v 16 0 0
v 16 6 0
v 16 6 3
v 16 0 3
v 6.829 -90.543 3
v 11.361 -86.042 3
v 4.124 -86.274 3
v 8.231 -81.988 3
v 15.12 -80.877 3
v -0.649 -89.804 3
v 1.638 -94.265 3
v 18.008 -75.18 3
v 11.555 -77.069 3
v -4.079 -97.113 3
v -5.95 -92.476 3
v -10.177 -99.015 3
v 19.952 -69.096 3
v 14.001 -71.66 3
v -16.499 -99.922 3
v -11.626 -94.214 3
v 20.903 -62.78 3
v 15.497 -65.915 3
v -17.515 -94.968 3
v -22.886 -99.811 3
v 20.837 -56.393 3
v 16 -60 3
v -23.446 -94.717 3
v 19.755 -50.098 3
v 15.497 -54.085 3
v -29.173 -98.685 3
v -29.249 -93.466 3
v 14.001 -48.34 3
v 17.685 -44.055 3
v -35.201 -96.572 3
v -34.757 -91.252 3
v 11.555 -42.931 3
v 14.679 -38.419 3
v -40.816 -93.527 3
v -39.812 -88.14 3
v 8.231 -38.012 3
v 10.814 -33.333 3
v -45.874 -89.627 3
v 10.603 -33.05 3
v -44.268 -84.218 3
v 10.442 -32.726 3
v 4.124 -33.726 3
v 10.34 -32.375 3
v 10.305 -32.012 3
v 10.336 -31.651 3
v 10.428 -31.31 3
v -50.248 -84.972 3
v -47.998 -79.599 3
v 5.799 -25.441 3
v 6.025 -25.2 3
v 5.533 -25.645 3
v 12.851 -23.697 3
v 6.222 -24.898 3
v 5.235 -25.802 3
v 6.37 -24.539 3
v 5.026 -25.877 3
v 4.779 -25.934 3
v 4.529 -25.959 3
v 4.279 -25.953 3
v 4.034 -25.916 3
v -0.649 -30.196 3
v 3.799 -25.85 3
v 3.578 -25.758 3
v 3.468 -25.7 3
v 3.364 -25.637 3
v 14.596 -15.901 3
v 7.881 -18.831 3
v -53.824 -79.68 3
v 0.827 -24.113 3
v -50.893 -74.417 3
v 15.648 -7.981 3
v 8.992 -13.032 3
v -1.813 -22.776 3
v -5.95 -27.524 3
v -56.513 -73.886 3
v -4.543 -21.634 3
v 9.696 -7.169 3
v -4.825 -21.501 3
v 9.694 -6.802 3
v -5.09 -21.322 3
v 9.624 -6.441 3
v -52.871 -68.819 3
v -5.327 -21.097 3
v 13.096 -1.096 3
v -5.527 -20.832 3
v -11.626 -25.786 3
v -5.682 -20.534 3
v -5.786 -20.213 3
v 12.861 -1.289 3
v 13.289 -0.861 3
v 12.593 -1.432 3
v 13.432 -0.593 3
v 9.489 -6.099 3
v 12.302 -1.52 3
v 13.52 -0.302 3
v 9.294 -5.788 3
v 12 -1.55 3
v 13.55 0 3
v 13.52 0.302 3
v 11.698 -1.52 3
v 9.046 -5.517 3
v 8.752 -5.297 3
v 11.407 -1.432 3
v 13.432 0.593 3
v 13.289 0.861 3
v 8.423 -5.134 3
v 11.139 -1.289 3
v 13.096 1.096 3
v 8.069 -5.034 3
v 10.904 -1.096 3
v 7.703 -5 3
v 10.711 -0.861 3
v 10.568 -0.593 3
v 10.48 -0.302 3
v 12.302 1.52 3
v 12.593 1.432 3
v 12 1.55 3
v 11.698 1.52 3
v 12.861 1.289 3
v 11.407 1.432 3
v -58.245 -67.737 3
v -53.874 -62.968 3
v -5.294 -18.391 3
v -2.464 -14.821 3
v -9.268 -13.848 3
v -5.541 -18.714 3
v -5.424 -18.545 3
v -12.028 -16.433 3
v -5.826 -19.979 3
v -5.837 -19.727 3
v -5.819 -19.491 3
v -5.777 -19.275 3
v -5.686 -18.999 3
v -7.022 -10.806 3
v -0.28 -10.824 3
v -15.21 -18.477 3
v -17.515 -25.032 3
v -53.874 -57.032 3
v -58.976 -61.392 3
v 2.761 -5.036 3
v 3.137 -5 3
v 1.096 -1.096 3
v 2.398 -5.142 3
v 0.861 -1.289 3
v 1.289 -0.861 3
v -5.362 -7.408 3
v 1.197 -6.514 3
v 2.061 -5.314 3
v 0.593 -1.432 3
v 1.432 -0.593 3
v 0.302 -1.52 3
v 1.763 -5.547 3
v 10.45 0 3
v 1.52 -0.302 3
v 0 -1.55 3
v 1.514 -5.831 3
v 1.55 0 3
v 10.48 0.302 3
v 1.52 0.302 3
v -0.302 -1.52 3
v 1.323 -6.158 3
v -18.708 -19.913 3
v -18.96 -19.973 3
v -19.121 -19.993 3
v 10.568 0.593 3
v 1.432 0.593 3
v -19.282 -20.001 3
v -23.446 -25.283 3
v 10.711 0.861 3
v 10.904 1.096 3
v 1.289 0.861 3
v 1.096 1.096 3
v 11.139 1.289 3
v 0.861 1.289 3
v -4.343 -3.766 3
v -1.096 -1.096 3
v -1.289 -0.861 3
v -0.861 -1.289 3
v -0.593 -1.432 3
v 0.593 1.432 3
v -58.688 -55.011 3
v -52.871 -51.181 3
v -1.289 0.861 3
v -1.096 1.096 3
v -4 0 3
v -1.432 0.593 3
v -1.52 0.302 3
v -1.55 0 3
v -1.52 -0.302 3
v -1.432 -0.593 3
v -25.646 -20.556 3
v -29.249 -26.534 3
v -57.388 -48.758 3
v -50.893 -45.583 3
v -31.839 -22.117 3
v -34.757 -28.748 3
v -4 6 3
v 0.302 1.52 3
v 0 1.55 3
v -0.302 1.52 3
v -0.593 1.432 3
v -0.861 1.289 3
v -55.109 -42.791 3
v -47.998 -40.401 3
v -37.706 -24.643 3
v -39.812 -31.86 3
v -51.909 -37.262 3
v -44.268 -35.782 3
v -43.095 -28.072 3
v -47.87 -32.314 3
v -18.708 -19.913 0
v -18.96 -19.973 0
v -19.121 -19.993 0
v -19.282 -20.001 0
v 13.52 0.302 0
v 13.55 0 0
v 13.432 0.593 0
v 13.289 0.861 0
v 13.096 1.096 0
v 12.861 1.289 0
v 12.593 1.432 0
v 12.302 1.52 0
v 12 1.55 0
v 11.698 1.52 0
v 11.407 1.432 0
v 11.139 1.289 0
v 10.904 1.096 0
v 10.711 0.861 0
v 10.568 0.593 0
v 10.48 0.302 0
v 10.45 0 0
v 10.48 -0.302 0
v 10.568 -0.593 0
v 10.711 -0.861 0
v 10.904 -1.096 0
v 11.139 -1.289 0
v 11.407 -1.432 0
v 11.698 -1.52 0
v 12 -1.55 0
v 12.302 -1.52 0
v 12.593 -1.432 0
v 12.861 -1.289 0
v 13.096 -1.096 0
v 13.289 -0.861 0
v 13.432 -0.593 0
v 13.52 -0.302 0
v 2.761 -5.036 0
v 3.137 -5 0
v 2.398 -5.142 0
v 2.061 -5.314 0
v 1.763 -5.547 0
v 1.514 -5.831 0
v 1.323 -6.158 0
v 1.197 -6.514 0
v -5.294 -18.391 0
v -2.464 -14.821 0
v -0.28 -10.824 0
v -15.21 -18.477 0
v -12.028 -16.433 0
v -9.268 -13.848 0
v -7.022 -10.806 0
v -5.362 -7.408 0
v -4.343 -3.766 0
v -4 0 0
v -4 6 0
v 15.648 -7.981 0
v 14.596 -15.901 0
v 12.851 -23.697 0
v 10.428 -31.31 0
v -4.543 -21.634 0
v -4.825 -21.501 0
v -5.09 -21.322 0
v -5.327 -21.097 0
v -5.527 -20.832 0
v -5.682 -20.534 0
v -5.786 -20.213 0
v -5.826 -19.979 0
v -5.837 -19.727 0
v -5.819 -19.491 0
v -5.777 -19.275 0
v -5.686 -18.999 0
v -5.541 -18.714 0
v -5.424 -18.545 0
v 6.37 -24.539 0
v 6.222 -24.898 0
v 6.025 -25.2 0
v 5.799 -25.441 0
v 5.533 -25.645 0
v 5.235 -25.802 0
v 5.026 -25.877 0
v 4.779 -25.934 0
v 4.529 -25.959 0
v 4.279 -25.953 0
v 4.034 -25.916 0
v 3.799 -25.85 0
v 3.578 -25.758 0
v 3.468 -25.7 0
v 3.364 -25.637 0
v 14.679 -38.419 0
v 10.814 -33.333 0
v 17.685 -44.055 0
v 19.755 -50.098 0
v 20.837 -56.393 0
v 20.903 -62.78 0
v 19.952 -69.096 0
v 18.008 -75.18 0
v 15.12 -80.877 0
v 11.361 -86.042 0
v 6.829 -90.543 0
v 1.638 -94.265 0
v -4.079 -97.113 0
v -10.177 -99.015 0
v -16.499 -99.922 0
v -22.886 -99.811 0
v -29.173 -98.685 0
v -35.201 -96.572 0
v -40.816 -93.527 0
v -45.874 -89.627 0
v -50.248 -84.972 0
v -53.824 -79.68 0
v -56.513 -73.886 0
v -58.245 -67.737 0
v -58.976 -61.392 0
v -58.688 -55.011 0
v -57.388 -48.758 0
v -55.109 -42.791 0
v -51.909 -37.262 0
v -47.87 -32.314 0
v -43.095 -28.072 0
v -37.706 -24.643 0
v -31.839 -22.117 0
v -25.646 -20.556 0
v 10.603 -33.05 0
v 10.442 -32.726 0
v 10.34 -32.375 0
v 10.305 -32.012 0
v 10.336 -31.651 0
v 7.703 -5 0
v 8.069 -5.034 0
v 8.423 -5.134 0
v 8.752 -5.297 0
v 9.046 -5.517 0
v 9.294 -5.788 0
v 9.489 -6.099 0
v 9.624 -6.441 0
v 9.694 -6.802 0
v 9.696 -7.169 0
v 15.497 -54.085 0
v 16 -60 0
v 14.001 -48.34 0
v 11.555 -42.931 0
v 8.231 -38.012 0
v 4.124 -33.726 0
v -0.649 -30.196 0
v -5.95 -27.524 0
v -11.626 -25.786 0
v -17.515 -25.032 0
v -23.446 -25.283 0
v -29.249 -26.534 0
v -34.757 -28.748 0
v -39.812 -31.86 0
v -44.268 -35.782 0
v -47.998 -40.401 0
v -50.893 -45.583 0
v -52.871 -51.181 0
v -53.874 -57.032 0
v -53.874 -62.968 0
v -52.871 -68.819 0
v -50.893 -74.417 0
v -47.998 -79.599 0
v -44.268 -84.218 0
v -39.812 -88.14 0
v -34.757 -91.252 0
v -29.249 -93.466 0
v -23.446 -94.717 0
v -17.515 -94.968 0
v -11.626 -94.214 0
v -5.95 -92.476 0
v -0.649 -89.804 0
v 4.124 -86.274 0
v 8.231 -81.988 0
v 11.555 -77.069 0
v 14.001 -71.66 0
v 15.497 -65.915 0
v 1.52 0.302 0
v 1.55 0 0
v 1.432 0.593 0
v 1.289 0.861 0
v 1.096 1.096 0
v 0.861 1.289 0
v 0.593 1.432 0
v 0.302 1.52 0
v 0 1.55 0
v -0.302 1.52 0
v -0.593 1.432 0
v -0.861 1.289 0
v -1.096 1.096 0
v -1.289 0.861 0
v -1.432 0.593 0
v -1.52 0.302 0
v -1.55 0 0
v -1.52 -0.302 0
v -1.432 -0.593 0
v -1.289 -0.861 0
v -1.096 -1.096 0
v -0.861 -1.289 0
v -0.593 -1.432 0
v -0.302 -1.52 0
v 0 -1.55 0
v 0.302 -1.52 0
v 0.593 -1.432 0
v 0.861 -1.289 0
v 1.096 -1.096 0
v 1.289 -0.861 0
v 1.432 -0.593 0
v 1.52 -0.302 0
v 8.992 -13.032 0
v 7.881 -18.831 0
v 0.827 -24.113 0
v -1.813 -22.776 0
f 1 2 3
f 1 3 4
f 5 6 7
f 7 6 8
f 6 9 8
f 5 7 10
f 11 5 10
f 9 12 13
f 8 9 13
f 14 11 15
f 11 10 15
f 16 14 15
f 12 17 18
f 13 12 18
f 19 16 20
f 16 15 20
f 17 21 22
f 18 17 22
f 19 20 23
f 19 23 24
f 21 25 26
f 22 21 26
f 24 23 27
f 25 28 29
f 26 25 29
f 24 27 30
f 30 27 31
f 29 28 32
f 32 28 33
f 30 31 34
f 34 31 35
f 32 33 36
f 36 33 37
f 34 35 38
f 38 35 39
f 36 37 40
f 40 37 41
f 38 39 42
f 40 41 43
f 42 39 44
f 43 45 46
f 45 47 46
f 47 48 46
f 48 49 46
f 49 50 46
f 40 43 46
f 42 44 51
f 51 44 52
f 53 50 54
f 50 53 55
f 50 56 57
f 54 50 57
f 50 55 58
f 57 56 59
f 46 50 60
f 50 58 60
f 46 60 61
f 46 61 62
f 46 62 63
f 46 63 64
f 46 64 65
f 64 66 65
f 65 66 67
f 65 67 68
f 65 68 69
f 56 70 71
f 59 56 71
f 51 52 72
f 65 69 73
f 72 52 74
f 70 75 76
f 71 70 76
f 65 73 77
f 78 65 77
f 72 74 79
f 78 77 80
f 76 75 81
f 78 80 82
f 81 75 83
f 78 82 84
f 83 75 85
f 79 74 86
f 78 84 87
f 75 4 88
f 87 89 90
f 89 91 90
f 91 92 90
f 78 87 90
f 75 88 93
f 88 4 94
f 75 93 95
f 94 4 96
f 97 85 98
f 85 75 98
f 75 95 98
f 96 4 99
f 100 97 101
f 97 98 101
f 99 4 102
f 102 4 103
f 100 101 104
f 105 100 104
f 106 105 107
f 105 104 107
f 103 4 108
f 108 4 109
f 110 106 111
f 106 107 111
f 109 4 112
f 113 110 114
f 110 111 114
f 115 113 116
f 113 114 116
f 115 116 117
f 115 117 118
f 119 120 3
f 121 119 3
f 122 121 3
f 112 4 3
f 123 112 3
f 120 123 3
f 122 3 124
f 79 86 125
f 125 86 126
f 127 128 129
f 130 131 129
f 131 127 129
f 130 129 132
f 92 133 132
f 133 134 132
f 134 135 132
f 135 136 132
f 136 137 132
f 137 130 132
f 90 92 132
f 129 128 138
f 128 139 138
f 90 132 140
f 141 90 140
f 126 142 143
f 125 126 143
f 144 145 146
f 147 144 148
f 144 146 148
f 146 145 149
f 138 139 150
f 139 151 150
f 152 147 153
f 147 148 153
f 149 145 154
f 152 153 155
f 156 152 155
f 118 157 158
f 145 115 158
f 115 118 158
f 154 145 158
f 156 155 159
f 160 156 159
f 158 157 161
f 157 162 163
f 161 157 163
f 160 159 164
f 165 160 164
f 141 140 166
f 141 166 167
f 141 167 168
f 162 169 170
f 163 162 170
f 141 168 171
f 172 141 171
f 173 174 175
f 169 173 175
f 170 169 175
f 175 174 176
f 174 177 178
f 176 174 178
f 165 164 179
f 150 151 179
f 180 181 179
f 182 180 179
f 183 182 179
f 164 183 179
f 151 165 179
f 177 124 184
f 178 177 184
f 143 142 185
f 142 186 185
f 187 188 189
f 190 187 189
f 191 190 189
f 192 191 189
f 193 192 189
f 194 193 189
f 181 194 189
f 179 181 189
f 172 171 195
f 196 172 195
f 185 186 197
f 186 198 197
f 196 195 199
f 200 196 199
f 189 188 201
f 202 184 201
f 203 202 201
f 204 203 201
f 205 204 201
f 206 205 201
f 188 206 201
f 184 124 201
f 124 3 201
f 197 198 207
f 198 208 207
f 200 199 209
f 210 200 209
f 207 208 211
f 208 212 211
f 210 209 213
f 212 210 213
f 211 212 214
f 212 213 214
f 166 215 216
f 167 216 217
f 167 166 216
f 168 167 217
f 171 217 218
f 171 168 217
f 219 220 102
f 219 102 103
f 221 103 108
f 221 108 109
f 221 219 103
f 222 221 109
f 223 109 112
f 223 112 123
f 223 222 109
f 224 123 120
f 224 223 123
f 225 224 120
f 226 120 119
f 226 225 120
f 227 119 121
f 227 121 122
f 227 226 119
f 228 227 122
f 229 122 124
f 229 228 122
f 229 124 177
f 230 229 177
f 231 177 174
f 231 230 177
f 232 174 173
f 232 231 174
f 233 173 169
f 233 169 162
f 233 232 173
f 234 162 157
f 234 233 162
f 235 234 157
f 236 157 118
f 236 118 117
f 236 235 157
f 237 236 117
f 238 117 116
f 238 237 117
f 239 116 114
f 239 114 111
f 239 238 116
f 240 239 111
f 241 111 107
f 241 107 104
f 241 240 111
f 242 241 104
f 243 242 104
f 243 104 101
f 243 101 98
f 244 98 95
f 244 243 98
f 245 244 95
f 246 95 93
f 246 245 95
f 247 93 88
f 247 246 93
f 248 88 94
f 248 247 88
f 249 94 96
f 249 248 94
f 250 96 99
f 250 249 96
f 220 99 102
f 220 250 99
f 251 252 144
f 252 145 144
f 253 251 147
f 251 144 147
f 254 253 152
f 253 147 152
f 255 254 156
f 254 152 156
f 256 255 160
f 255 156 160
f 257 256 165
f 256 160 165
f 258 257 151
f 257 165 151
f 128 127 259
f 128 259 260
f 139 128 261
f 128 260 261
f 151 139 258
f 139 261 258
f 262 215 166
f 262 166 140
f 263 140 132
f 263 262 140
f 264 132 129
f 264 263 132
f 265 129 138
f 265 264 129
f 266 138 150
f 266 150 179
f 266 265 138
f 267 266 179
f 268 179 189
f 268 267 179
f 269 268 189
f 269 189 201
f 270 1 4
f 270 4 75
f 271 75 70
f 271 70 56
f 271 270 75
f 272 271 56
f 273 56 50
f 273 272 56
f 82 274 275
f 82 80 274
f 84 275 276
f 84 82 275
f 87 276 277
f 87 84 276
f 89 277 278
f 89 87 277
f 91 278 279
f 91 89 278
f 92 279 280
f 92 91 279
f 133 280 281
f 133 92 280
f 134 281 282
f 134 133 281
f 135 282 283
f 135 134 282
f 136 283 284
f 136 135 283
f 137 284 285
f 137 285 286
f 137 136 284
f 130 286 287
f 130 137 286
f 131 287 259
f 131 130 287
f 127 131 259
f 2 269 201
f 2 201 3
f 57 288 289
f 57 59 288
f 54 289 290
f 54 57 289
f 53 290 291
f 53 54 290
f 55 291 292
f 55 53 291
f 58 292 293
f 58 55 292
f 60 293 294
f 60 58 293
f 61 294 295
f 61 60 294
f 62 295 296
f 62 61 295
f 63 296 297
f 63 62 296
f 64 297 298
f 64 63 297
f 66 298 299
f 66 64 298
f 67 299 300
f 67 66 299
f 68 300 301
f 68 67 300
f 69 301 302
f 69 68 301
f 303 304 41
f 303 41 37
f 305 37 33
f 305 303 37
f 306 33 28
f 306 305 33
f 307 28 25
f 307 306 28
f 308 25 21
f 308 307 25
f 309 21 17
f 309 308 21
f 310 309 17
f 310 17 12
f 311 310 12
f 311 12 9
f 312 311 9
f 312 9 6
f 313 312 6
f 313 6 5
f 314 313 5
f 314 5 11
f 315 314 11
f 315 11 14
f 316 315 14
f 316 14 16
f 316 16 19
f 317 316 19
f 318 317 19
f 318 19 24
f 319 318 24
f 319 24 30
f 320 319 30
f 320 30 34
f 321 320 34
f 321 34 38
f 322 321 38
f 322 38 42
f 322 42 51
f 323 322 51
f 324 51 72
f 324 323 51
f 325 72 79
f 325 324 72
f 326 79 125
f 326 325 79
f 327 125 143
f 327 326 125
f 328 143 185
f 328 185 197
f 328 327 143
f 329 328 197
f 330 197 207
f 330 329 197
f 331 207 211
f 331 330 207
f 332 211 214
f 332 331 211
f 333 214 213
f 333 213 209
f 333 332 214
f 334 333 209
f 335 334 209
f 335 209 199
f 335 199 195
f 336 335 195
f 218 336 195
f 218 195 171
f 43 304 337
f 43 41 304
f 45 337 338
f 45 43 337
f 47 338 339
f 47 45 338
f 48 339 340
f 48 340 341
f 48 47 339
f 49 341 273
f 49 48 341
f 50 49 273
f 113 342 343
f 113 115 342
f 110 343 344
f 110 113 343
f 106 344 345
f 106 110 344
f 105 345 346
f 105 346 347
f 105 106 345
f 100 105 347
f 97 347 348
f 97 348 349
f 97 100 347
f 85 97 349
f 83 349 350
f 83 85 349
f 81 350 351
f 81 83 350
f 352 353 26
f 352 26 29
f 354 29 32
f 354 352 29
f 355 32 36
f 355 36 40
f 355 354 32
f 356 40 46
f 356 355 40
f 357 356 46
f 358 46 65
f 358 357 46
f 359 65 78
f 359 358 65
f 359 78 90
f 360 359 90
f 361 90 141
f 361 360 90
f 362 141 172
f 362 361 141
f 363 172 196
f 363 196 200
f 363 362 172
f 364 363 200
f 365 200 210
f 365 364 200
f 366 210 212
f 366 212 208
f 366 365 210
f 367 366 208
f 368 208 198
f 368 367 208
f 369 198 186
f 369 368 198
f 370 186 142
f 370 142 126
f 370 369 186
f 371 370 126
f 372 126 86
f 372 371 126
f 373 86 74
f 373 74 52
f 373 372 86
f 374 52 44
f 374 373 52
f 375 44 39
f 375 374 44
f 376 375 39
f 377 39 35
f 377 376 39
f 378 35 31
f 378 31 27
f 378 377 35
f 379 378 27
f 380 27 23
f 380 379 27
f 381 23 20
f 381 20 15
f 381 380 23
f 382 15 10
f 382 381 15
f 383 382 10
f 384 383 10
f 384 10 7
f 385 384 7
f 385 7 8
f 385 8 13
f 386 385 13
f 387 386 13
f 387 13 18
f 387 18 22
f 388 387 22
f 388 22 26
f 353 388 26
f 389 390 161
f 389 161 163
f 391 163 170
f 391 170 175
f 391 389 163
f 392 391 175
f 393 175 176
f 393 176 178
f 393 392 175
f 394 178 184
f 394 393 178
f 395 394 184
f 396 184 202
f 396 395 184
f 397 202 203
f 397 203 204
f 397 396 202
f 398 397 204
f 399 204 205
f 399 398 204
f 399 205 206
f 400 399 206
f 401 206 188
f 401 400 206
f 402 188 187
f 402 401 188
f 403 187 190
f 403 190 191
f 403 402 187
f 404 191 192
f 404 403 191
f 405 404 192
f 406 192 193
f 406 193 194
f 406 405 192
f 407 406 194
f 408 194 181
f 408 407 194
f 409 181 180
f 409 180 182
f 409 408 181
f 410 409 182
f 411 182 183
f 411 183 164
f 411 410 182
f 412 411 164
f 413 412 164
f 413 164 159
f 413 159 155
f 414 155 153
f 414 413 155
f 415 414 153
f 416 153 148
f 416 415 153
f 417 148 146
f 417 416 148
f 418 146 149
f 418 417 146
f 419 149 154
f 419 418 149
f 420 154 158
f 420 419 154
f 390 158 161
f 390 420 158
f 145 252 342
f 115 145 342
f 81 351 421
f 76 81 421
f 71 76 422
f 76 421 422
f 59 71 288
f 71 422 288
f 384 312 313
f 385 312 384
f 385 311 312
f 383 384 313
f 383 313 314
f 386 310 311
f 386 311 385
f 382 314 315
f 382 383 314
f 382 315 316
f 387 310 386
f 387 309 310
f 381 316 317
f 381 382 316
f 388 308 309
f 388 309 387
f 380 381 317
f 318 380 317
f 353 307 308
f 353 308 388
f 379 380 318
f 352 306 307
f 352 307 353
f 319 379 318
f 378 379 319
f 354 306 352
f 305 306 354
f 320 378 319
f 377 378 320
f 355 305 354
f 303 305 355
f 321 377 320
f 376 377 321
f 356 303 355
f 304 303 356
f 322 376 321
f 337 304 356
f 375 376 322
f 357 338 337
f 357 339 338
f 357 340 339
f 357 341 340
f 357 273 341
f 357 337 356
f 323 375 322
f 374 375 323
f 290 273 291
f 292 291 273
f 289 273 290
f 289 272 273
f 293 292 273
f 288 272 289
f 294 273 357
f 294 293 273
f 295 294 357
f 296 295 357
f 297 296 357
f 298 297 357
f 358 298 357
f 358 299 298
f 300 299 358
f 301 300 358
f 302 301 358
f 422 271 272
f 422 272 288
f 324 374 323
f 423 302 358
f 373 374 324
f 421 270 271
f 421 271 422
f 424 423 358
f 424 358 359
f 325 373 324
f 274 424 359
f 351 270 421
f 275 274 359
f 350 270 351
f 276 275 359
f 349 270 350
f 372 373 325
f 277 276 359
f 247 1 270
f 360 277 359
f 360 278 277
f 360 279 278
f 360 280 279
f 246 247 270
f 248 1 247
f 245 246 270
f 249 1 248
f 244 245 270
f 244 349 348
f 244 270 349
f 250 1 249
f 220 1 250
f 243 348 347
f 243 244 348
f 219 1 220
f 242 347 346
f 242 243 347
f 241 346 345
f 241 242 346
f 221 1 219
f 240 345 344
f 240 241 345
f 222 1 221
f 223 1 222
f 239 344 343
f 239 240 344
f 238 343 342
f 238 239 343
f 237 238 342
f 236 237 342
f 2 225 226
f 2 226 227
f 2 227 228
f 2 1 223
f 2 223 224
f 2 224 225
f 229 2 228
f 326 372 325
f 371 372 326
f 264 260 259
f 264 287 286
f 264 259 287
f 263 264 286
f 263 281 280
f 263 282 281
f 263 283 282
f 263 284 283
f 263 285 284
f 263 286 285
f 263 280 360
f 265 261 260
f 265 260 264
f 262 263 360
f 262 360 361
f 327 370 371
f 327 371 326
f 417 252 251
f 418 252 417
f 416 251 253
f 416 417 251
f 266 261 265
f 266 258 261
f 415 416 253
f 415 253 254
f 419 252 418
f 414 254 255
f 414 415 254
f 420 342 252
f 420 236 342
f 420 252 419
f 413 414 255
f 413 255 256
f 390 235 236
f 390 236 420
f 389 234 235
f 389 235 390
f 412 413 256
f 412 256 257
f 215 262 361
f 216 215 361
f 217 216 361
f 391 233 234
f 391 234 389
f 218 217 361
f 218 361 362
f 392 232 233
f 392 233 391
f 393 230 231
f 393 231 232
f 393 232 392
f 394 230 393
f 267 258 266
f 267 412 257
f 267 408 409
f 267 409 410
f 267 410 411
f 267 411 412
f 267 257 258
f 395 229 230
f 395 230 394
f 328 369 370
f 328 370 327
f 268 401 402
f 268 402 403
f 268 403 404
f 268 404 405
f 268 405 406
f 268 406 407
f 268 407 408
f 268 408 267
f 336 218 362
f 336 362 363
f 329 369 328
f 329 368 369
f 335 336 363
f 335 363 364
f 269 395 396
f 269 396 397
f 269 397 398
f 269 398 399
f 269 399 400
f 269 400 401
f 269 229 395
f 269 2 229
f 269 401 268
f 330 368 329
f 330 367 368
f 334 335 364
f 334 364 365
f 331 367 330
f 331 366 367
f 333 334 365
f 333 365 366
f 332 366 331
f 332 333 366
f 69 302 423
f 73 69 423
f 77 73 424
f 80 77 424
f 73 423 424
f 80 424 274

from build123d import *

# Parameters (mm, degrees)
SKETCH_1_R      = 1.55
SKETCH_1_R_2    = 35
EXTRUDE_1_DEPTH = 3
FILLET_1_R      = 2


with BuildPart() as part:
    # 草图1 → 凸台-拉伸1 (new body)
    with BuildSketch(Plane.XY):
        with BuildLine():
            Line((-4, 0), (-4, 6))
            Line((-4, 6), (16, 6))
            Line((16, 6), (16, 0))
            ThreePointArc((16, 0), (14.487394132, -16.500041247), (10, -32.450045372))
            ThreePointArc((10, -32.450045372), (-34.779762591, -96.755939555), (-19, -20))
            ThreePointArc((-19, -20), (-8.166666667, -12.5), (-4, 0))
        make_face()
        Circle(SKETCH_1_R, mode=Mode.SUBTRACT)
        with Locations((12, 0)):
            Circle(SKETCH_1_R, mode=Mode.SUBTRACT)
        with Locations((-19, -60)):
            Circle(SKETCH_1_R_2, mode=Mode.SUBTRACT)
        with BuildLine():
            Line((1.53004615, -5), (9.8523796, -5))
            ThreePointArc((9.8523796, -5), (8.433483023, -16.219496713), (5.533456158, -27.150197429))
            ThreePointArc((5.533456158, -27.150197429), (-0.758932149, -23.281293002), (-7.64339635, -20.60421909))
            ThreePointArc((-7.64339635, -20.60421909), (-1.701196442, -13.598971308), (1.53004615, -5))
        make_face(mode=Mode.SUBTRACT)
    extrude(amount=EXTRUDE_1_DEPTH)

    # 圆角1
    fillet_1_edges = [part.edges().sort_by_distance(p)[0] for p in [
        (-19, -20, 1.5),
        (10, -32.450045372, 1.5),
        (-7.64339635, -20.60421909, 1.5),
        (5.533456158, -27.150197429, 1.5),
        (9.8523796, -5, 1.5),
        (1.53004615, -5, 1.5),
    ]]
    fillet(fillet_1_edges, radius=FILLET_1_R)


solid = part.part
